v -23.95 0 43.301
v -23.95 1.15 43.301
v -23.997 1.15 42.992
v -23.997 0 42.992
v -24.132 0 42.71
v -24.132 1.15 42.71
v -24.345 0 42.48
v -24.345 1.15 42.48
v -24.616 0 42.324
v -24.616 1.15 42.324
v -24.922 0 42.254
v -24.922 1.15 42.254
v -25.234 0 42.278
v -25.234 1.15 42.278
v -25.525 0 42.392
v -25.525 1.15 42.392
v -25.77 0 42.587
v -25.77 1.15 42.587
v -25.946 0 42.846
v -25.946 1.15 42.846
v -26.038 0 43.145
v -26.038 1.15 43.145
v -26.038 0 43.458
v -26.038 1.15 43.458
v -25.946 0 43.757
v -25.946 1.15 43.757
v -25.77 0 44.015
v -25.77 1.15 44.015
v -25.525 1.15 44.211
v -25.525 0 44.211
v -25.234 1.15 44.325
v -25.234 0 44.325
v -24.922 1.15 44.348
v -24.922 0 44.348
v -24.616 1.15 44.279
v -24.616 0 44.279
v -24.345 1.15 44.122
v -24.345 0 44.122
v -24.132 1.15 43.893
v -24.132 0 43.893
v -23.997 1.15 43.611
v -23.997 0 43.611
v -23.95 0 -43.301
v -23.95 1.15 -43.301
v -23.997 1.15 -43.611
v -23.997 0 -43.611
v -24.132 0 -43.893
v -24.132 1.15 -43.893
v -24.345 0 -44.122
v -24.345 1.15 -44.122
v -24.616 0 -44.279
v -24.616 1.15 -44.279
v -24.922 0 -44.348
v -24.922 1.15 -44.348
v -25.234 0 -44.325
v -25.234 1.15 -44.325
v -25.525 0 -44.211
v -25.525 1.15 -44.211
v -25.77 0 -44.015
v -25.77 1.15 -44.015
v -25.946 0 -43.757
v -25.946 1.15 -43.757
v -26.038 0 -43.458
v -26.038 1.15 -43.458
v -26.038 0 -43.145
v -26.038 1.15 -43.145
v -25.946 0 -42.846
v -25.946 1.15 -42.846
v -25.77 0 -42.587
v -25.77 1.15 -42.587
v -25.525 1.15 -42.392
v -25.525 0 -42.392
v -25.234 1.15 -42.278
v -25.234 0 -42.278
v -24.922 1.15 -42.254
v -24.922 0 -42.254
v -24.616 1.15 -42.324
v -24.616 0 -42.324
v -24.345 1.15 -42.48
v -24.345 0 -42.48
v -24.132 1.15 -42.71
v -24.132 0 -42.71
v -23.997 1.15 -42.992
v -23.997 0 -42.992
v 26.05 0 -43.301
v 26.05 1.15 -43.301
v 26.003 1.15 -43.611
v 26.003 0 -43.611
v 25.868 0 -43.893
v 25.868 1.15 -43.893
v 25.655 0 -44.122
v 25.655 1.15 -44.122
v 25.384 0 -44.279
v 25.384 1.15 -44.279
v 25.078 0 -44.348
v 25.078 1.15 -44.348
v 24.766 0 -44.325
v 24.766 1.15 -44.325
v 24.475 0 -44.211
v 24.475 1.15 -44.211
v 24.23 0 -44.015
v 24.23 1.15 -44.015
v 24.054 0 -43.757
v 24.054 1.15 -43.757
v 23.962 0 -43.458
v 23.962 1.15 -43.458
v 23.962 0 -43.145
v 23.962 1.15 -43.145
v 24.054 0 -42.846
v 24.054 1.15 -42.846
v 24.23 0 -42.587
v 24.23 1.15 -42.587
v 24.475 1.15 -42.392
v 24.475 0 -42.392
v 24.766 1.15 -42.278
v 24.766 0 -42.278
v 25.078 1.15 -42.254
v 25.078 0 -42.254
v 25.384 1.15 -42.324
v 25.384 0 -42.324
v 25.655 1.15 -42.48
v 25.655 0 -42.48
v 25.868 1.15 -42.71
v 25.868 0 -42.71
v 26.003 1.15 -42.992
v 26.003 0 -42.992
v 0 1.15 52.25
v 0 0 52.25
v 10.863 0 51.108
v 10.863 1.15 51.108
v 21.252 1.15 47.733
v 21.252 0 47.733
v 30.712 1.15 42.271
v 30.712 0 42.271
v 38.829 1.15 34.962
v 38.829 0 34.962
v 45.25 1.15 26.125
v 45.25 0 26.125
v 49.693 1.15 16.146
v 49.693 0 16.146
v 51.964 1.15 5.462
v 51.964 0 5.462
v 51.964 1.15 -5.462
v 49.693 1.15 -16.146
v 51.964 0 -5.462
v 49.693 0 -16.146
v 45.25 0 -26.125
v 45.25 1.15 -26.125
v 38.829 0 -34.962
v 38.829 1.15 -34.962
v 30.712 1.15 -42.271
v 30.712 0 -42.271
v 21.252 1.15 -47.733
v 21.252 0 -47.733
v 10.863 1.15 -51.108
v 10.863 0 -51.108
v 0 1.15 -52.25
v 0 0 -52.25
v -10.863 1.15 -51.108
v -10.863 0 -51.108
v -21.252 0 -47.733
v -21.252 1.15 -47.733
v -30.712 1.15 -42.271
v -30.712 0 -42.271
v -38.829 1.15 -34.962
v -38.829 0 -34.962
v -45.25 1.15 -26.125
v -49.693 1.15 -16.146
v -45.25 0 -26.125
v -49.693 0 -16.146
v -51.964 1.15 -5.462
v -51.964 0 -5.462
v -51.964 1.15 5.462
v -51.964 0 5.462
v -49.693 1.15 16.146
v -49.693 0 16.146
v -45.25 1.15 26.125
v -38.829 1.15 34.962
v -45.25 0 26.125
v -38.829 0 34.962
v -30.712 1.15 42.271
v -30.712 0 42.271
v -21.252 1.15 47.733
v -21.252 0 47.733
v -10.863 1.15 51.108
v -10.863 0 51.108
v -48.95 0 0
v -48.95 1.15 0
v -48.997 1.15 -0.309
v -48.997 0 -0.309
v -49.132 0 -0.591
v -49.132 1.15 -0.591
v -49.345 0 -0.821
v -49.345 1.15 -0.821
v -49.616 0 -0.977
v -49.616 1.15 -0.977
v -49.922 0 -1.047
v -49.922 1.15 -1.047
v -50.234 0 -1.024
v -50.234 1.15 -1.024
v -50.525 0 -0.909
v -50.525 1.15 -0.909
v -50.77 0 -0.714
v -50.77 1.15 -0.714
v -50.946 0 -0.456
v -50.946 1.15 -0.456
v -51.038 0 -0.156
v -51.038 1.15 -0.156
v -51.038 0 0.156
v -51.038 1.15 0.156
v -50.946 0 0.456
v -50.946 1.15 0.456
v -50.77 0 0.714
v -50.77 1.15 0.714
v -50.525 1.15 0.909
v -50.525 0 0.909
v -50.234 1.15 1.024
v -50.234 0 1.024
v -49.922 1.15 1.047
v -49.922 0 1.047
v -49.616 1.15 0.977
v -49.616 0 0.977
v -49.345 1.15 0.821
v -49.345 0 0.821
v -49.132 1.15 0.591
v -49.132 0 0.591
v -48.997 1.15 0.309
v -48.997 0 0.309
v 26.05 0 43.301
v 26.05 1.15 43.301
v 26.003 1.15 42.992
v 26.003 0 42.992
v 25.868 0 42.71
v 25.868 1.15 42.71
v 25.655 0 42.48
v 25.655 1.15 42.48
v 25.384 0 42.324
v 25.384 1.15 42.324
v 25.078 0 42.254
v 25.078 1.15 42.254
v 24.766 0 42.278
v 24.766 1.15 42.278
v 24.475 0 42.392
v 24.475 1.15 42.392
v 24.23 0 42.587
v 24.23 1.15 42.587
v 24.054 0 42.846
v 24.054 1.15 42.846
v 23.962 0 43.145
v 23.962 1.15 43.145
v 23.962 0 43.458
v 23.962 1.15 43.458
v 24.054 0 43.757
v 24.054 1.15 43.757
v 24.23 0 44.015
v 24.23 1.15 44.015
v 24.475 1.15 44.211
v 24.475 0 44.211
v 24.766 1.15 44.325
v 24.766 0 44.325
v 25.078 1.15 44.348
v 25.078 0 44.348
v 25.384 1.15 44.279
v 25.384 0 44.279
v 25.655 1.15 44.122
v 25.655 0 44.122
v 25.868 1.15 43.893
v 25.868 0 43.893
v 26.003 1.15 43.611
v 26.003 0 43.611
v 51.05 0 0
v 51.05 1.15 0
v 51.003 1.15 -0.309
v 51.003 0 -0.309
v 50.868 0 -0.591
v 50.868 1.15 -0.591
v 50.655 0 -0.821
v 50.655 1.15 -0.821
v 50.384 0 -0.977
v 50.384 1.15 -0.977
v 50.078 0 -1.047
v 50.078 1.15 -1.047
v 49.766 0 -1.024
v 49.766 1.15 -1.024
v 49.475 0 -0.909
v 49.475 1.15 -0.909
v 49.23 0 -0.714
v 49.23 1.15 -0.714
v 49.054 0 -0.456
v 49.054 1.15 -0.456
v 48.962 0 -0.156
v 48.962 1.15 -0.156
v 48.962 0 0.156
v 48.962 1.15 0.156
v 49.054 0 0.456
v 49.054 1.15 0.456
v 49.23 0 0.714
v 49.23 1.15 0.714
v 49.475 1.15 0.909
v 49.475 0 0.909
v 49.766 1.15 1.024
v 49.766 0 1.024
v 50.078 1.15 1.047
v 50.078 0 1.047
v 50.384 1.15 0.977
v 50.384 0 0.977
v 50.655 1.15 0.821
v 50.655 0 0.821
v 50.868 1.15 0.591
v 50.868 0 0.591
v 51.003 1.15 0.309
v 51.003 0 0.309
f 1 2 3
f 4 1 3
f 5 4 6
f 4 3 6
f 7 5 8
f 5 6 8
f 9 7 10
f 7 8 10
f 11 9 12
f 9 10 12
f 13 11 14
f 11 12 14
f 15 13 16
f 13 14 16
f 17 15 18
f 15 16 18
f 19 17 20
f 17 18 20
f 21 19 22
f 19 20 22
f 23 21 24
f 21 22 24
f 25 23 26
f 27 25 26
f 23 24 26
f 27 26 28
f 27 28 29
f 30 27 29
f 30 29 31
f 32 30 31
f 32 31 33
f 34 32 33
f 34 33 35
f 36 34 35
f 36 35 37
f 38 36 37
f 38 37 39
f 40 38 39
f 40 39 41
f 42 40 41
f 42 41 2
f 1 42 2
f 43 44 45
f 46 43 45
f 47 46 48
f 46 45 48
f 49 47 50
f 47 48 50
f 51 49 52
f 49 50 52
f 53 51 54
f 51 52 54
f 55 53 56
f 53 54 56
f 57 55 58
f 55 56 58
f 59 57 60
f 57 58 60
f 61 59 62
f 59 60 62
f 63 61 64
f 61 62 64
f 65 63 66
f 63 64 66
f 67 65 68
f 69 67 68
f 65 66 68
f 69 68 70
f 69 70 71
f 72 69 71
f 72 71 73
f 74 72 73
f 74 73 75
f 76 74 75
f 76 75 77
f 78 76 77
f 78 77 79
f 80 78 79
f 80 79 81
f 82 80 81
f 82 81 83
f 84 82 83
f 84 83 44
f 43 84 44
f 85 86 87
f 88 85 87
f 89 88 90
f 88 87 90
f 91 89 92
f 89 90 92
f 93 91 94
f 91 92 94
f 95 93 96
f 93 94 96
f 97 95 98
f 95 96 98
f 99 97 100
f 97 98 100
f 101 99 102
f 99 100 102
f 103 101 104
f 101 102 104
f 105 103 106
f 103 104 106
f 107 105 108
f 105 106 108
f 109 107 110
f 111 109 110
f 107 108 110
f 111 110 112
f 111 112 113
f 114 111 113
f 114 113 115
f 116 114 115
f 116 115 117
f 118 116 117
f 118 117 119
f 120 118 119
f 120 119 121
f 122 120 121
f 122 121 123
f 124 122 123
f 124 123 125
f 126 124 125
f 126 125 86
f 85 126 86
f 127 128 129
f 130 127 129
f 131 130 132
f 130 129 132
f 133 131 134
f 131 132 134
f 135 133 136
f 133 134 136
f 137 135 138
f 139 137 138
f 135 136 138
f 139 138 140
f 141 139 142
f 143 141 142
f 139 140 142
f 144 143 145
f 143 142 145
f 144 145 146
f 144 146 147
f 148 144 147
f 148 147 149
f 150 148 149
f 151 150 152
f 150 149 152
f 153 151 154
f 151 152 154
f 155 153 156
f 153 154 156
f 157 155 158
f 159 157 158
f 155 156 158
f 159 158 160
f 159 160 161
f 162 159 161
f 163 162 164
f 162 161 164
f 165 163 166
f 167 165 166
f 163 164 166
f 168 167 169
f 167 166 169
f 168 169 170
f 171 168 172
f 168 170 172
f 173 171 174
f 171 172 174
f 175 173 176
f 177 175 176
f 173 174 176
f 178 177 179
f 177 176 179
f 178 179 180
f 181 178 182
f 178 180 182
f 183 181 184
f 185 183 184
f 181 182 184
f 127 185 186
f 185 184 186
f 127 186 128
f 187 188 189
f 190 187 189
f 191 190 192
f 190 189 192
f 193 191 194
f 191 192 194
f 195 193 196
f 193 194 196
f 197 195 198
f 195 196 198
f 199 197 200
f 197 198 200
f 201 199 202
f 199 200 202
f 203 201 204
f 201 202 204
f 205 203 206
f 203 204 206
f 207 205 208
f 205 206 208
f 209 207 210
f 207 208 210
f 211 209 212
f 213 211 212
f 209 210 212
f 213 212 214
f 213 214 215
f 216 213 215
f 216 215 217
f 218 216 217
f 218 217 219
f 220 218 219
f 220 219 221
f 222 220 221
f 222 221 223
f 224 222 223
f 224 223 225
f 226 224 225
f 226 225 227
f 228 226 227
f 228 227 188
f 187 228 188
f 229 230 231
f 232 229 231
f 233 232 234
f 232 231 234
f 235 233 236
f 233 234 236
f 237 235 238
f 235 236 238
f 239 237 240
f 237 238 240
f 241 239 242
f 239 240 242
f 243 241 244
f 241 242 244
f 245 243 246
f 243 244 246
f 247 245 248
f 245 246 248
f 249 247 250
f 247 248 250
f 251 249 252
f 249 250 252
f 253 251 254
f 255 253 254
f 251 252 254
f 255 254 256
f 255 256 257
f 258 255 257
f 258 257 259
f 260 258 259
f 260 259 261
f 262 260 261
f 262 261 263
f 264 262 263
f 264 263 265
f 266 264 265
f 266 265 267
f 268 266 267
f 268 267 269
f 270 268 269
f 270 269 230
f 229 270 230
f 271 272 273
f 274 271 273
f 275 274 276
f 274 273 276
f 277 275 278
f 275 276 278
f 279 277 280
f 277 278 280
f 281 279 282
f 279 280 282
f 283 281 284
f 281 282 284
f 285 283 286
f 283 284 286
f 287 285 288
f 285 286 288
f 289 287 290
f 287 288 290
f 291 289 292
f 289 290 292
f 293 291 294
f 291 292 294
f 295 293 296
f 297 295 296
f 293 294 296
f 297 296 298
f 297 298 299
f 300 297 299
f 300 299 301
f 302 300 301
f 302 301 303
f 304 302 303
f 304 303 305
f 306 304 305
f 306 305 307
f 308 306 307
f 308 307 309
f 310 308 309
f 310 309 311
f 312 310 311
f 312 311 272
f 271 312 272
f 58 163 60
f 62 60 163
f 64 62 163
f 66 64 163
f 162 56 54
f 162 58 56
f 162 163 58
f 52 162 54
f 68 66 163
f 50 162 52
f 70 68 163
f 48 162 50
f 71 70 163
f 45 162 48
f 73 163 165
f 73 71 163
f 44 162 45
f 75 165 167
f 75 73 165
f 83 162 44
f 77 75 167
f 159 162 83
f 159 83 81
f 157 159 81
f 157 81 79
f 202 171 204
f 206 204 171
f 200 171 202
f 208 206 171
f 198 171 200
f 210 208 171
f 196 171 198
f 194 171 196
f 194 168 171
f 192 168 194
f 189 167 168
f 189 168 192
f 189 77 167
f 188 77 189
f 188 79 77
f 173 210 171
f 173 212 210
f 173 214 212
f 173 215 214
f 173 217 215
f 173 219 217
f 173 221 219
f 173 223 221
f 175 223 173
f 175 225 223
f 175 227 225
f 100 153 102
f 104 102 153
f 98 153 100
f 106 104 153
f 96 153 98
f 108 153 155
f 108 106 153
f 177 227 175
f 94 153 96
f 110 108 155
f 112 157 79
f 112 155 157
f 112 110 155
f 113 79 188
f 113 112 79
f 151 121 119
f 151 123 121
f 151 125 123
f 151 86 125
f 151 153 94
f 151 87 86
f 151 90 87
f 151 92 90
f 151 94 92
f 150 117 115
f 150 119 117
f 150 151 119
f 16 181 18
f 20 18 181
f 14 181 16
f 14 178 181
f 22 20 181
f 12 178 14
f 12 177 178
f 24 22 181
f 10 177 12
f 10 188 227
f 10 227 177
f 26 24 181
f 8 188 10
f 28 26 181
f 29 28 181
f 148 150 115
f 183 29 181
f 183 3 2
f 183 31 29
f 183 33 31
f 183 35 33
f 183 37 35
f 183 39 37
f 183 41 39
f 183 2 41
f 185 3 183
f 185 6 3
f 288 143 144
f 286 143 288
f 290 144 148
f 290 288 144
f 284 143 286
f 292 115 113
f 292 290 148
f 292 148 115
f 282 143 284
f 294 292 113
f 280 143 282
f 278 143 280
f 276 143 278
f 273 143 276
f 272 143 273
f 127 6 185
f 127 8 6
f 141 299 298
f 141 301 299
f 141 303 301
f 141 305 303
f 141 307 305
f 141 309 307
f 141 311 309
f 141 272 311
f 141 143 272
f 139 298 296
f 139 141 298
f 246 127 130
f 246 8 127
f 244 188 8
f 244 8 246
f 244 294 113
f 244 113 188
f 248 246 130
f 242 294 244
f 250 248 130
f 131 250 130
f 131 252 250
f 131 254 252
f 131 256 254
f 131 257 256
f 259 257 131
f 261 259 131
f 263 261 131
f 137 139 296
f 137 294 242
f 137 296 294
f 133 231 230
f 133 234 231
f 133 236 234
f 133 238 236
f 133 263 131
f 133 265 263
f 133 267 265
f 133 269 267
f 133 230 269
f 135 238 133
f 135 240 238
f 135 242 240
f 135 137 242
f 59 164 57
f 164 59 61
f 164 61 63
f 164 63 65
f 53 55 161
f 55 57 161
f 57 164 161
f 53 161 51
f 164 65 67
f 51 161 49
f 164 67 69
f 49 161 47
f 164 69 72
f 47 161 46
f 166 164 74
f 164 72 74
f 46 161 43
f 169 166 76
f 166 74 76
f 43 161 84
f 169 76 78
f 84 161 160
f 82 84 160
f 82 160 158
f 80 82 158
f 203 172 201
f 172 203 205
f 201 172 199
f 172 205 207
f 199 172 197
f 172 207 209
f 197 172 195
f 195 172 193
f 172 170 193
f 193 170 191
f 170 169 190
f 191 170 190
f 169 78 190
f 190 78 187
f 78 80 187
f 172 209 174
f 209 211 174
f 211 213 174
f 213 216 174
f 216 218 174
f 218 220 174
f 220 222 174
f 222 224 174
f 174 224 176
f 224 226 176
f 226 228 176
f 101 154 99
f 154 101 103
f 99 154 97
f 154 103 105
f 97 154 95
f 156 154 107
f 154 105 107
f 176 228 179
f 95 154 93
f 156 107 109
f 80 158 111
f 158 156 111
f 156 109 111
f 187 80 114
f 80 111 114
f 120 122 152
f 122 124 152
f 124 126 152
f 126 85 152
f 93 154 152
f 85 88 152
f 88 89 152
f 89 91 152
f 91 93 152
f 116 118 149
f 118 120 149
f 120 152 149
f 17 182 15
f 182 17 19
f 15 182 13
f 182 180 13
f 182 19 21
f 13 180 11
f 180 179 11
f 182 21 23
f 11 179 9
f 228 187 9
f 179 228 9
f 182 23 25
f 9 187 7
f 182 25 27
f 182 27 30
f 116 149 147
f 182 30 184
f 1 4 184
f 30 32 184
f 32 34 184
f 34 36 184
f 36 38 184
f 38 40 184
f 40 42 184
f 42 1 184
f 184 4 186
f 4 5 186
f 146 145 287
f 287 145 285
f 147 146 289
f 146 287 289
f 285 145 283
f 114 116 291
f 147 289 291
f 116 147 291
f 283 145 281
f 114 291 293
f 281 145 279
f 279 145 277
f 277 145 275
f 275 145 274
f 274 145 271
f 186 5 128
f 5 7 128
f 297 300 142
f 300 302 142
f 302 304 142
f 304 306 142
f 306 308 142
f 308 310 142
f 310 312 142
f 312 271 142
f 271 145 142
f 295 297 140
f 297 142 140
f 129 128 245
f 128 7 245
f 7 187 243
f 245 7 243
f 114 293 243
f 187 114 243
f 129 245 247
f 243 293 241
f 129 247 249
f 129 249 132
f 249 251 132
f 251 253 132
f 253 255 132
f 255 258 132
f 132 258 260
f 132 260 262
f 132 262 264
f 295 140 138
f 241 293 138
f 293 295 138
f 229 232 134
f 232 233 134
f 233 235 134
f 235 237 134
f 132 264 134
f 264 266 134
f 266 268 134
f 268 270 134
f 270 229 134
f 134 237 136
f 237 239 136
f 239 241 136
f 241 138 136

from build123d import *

# Parameters (mm, degrees)
SKETCH1_R                  = 52.25
BASE_FLANGE4_DEPTH         = 1.15
F_2_1_2_1_DIAMETER_HOLE2_D = 2.1


# Sheet-metal steps are written as plain solids
with BuildPart() as part:
    # Sketch1 → Base-Flange4 (new body)
    with BuildSketch(Plane(origin=(0, 0, 0), x_dir=(1, 0, 0), z_dir=(0, 1, 0))):
        with Locations(Location((0, 0, 0), (0, 0, 270))):
            Circle(SKETCH1_R)
    extrude(amount=BASE_FLANGE4_DEPTH)

    # Ø2.1 (2.1) Diameter Hole2 (through all)
    with Locations(Plane(origin=(0, 0, 0), x_dir=(-1, 0, 0), z_dir=(0, -1, 0))):
        with Locations((50, 0), (25, -43.301270189), (-25, -43.301270189), (-50, 0), (-25, 43.301270189), (25, 43.301270189)):
            Hole(F_2_1_2_1_DIAMETER_HOLE2_D / 2)


solid = part.part
